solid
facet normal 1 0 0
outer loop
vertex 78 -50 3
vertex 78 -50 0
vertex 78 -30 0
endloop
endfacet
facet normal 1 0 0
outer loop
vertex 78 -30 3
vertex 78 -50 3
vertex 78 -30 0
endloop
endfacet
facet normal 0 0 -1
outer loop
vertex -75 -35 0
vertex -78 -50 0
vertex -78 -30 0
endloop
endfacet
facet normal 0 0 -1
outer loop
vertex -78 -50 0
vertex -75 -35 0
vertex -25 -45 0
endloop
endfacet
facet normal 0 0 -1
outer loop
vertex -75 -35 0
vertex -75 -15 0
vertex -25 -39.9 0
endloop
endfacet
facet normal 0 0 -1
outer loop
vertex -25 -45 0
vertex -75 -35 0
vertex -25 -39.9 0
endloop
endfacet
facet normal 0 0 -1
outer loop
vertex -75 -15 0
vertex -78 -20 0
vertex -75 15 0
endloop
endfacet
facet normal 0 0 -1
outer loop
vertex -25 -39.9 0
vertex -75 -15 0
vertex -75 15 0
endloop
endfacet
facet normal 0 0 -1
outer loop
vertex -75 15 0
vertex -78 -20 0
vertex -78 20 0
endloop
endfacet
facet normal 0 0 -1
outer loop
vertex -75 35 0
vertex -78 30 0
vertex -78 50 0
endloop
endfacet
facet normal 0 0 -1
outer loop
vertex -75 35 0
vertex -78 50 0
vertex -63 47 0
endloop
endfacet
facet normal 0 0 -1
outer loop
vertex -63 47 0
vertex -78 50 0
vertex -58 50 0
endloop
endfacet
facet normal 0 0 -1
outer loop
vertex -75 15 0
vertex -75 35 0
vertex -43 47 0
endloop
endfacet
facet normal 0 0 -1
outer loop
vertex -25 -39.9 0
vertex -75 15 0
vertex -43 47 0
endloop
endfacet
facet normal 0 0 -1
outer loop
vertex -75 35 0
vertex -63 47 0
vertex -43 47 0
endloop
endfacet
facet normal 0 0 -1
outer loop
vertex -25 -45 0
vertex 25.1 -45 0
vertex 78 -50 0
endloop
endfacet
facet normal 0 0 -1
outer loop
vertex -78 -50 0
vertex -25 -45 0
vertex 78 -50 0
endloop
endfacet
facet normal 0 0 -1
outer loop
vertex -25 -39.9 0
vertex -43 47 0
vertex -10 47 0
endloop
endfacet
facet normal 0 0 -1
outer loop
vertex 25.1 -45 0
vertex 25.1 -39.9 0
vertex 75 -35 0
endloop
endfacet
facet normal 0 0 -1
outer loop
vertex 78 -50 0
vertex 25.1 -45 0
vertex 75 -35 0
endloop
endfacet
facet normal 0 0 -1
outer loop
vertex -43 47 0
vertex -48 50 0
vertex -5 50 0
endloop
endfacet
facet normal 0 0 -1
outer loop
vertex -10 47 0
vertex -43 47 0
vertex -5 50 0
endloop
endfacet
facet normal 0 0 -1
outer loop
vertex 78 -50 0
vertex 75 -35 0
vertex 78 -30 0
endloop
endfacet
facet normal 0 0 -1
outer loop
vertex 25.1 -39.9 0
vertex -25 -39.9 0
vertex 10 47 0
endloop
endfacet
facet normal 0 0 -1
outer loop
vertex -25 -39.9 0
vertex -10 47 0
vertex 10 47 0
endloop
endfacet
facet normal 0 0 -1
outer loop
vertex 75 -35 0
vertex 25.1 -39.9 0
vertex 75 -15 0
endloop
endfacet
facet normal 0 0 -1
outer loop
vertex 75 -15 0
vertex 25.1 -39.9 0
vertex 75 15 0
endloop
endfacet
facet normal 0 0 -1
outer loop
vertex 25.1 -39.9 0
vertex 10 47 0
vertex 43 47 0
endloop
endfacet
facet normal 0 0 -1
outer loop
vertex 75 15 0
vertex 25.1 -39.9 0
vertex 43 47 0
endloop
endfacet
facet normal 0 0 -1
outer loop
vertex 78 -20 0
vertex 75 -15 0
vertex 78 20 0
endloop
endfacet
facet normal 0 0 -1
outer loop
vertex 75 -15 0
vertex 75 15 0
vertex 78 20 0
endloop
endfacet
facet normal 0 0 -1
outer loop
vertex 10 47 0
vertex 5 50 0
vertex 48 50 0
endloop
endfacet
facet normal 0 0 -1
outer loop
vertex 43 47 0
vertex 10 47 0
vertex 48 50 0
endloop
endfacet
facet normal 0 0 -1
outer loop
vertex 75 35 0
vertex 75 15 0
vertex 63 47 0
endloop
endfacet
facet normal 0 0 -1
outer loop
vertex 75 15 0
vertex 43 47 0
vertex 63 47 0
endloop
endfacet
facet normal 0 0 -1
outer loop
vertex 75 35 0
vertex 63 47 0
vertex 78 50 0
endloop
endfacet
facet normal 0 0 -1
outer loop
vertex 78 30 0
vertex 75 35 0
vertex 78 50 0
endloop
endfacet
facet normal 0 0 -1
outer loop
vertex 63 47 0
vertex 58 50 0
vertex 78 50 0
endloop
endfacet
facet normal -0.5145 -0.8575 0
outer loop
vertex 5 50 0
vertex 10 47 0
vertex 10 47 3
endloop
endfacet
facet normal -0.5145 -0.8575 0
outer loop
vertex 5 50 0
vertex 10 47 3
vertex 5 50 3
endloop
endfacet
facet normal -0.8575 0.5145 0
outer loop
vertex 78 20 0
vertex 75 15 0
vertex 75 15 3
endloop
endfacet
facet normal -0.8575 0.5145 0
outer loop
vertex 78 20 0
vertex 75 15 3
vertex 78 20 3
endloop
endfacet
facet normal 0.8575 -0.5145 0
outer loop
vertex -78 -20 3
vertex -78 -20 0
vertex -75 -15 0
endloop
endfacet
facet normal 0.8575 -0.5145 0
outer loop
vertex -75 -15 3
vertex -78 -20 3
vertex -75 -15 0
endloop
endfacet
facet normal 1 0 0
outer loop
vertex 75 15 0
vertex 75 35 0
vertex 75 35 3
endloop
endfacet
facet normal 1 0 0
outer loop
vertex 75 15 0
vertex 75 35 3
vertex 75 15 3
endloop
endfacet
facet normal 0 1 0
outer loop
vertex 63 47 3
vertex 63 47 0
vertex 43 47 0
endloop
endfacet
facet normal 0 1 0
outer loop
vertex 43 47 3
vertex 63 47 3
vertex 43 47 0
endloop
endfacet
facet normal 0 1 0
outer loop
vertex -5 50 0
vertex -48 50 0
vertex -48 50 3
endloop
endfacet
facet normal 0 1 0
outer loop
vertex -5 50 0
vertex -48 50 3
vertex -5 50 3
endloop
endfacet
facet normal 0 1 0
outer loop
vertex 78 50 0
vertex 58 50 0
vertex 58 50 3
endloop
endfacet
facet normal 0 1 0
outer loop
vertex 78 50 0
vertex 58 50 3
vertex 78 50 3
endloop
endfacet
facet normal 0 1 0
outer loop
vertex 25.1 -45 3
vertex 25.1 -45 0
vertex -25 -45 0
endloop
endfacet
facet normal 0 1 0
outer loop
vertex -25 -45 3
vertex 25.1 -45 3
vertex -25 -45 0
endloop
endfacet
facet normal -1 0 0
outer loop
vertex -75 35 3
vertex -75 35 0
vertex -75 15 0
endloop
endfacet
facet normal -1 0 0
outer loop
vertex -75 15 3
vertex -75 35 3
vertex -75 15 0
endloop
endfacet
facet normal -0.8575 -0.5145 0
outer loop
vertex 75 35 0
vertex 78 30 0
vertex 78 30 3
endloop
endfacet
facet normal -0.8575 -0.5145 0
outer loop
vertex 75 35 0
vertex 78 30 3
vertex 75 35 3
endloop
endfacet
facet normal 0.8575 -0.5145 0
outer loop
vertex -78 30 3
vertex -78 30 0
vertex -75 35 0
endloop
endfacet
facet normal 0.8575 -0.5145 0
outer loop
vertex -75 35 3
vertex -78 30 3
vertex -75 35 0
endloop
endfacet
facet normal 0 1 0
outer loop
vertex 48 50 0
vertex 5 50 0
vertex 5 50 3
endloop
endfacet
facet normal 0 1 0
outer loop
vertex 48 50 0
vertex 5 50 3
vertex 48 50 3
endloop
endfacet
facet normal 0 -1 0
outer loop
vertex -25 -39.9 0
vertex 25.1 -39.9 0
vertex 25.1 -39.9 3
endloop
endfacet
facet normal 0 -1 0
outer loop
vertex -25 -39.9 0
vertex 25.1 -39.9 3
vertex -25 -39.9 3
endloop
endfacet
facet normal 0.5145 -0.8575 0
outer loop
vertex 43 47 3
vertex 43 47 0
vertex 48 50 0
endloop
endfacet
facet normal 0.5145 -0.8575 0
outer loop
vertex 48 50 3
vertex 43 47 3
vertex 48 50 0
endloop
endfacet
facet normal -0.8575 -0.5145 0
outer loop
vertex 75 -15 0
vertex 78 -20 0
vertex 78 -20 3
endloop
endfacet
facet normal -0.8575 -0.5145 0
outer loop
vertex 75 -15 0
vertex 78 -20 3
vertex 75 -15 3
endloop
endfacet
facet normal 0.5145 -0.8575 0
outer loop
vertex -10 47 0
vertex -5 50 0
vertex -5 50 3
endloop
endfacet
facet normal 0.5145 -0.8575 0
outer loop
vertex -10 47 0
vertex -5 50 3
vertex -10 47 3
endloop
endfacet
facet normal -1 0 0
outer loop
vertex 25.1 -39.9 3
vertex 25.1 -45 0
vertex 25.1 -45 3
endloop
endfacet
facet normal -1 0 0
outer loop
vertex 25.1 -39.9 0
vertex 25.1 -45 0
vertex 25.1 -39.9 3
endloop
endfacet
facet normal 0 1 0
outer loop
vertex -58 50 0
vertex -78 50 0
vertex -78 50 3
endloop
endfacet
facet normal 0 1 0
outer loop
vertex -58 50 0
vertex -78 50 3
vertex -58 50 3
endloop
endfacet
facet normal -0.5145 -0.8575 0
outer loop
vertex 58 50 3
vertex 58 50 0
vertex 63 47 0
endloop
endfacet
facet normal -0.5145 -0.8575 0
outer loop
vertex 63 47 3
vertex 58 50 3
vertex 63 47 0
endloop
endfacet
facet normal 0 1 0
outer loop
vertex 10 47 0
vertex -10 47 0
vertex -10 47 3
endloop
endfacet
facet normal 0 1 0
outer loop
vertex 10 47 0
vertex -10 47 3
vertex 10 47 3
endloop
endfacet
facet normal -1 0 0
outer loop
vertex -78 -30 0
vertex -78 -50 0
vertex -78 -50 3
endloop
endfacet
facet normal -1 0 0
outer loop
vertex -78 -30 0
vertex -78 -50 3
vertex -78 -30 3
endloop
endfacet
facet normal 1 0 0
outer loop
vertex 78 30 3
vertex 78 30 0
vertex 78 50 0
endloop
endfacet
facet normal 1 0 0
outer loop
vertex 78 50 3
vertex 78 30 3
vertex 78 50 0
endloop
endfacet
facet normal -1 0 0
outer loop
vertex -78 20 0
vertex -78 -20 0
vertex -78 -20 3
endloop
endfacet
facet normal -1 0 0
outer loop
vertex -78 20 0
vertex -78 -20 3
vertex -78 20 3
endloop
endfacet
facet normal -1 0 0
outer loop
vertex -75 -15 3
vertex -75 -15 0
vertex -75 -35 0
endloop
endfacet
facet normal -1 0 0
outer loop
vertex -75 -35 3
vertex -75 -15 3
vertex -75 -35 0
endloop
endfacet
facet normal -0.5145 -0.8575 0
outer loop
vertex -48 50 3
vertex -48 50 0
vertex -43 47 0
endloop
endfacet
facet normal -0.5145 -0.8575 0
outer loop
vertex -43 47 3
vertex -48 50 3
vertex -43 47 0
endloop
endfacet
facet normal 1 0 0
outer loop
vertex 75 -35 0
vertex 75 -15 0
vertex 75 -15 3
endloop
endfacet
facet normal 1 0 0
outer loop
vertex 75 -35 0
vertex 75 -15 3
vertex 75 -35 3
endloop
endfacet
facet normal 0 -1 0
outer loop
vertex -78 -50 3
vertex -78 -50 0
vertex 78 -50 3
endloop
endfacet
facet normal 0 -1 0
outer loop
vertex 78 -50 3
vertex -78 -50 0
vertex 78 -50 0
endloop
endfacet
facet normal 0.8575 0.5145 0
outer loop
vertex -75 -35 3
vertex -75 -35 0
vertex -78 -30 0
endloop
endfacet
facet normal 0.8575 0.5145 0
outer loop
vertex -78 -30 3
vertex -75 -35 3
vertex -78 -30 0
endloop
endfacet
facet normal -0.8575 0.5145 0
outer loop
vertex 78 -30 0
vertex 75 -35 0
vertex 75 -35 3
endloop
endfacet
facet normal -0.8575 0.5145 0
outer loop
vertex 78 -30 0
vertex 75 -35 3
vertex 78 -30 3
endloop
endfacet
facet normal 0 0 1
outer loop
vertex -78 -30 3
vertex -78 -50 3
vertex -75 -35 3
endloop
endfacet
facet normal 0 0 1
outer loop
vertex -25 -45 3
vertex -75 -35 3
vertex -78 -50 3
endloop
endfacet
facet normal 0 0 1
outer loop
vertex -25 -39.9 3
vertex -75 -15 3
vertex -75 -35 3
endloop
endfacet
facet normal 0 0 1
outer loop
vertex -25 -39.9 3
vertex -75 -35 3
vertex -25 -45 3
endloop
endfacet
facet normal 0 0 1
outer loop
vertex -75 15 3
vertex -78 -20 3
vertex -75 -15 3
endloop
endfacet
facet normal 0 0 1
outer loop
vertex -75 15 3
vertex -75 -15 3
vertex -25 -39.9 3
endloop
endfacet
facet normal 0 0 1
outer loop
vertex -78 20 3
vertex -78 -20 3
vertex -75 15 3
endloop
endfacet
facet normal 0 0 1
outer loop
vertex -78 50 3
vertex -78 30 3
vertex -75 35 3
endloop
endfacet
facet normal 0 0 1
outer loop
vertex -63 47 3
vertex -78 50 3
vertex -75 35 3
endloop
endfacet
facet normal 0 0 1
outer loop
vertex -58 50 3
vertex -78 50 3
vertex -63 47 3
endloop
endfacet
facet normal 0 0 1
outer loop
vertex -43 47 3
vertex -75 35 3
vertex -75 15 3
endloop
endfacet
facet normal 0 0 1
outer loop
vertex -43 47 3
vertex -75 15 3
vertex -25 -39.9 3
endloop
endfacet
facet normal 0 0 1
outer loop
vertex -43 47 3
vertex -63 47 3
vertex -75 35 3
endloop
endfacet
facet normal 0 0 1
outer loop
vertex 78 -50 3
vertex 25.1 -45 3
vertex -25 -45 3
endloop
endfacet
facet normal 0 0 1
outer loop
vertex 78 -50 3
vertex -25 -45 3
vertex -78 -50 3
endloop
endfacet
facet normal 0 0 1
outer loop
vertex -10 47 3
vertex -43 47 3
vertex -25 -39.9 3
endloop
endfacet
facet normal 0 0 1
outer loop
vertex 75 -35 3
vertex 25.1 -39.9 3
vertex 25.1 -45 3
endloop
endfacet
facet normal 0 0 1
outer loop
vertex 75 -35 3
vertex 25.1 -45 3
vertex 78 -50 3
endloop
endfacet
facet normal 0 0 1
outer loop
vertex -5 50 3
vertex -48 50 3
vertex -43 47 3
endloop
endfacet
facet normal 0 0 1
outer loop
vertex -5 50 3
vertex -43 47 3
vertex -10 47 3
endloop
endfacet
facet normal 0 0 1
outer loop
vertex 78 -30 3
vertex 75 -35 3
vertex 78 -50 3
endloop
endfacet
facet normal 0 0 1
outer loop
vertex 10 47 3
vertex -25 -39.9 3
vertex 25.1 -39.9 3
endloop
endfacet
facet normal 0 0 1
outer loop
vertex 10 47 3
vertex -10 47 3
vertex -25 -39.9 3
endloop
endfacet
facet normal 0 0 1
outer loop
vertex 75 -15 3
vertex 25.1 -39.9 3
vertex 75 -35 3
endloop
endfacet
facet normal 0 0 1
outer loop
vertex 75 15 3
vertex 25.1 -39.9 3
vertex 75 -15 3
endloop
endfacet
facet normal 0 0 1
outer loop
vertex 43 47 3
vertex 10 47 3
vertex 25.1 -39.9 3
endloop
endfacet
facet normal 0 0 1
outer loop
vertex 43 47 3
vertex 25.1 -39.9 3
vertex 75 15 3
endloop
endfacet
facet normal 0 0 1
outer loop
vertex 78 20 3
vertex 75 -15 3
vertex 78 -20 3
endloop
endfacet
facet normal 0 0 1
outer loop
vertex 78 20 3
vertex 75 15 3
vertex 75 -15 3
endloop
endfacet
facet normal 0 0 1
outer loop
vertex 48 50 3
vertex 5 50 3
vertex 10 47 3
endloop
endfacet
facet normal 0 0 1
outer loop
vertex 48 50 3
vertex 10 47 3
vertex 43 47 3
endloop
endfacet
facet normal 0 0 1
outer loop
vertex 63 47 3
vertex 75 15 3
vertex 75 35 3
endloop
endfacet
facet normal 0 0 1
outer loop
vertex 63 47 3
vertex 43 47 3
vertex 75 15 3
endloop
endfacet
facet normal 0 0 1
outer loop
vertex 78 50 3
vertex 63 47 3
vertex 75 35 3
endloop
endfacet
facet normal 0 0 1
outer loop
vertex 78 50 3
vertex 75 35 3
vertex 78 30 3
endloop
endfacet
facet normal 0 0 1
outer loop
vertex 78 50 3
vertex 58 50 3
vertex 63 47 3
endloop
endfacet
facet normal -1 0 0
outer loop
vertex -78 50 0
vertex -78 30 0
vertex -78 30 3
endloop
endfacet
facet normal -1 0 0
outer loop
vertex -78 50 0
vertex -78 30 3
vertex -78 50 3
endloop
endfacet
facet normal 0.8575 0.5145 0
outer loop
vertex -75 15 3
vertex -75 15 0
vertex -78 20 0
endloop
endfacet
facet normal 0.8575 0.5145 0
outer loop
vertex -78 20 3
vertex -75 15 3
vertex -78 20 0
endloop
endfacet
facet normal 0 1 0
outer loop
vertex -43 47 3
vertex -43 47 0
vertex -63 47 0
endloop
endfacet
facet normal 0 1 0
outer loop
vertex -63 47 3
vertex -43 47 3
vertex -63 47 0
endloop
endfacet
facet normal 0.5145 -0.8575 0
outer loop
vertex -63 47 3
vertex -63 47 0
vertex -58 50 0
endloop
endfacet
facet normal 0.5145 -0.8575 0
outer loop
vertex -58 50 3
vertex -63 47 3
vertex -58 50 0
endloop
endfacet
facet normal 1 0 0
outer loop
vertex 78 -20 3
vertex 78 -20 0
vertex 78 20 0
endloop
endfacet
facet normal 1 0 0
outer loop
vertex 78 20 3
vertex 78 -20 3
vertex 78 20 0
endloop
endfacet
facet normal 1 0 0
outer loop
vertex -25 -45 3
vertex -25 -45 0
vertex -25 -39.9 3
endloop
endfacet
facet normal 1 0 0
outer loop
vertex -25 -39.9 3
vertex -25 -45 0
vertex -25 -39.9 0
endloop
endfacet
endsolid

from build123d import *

# Parameters (mm, degrees)
ESQUISSE1_W             = 156
ESQUISSE1_H             = 100
BOSS_EXTRU_1_DEPTH      = 3
ENL_V_MAT_EXTRU_1_DEPTH = 3
ENL_V_MAT_EXTRU_3_DEPTH = 3
ENL_V_MAT_EXTRU_4_DEPTH = 3
ESQUISSE6_W             = 50.1
ESQUISSE6_H             = 5.1
ENL_V_MAT_EXTRU_5_DEPTH = 3


with BuildPart() as part:
    # Esquisse1 → Boss.-Extru.1 (new body)
    with BuildSketch(Plane.XY):
        Rectangle(ESQUISSE1_W, ESQUISSE1_H)
    extrude(amount=BOSS_EXTRU_1_DEPTH)

    # Esquisse2 → Enlèv. mat.-Extru.1 (cut)
    with BuildSketch(Plane(origin=(0, 0, 0), x_dir=(-1, 0, 0), z_dir=(0, 0, -1))):
        Polygon((-58, 50), (-63, 47), (-43, 47), (-48, 50), align=None)
        Polygon((-10, 47), (-5, 50), (5, 50), (10, 47), align=None)
        Polygon((48, 50), (43, 47), (63, 47), (58, 50), align=None)
    extrude(amount=-ENL_V_MAT_EXTRU_1_DEPTH, mode=Mode.SUBTRACT)

    # Esquisse4 → Enlèv. mat.-Extru.3 (cut)
    with BuildSketch(Plane(origin=(0, 0, 0), x_dir=(-1, 0, 0), z_dir=(0, 0, -1))):
        Polygon((-78, 30), (-75, 35), (-75, 15), (-78, 20), align=None)
        Polygon((-78, -20), (-75, -15), (-75, -35), (-78, -30), align=None)
    extrude(amount=-ENL_V_MAT_EXTRU_3_DEPTH, mode=Mode.SUBTRACT)

    # Esquisse5 → Enlèv. mat.-Extru.4 (cut)
    with BuildSketch(Plane(origin=(0, 0, 0), x_dir=(-1, 0, 0), z_dir=(0, 0, -1))):
        Polygon((78, 30), (75, 35), (75, 15), (78, 20), align=None)
        Polygon((78, -20), (75, -15), (75, -35), (78, -30), align=None)
    extrude(amount=-ENL_V_MAT_EXTRU_4_DEPTH, mode=Mode.SUBTRACT)

    # Esquisse6 → Enlèv. mat.-Extru.5 (cut)
    with BuildSketch(Plane(origin=(0, 0, 0), x_dir=(-1, 0, 0), z_dir=(0, 0, -1))):
        with Locations((-0.05, -42.45)):
            Rectangle(ESQUISSE6_W, ESQUISSE6_H)
    extrude(amount=-ENL_V_MAT_EXTRU_5_DEPTH, mode=Mode.SUBTRACT)


solid = part.part
